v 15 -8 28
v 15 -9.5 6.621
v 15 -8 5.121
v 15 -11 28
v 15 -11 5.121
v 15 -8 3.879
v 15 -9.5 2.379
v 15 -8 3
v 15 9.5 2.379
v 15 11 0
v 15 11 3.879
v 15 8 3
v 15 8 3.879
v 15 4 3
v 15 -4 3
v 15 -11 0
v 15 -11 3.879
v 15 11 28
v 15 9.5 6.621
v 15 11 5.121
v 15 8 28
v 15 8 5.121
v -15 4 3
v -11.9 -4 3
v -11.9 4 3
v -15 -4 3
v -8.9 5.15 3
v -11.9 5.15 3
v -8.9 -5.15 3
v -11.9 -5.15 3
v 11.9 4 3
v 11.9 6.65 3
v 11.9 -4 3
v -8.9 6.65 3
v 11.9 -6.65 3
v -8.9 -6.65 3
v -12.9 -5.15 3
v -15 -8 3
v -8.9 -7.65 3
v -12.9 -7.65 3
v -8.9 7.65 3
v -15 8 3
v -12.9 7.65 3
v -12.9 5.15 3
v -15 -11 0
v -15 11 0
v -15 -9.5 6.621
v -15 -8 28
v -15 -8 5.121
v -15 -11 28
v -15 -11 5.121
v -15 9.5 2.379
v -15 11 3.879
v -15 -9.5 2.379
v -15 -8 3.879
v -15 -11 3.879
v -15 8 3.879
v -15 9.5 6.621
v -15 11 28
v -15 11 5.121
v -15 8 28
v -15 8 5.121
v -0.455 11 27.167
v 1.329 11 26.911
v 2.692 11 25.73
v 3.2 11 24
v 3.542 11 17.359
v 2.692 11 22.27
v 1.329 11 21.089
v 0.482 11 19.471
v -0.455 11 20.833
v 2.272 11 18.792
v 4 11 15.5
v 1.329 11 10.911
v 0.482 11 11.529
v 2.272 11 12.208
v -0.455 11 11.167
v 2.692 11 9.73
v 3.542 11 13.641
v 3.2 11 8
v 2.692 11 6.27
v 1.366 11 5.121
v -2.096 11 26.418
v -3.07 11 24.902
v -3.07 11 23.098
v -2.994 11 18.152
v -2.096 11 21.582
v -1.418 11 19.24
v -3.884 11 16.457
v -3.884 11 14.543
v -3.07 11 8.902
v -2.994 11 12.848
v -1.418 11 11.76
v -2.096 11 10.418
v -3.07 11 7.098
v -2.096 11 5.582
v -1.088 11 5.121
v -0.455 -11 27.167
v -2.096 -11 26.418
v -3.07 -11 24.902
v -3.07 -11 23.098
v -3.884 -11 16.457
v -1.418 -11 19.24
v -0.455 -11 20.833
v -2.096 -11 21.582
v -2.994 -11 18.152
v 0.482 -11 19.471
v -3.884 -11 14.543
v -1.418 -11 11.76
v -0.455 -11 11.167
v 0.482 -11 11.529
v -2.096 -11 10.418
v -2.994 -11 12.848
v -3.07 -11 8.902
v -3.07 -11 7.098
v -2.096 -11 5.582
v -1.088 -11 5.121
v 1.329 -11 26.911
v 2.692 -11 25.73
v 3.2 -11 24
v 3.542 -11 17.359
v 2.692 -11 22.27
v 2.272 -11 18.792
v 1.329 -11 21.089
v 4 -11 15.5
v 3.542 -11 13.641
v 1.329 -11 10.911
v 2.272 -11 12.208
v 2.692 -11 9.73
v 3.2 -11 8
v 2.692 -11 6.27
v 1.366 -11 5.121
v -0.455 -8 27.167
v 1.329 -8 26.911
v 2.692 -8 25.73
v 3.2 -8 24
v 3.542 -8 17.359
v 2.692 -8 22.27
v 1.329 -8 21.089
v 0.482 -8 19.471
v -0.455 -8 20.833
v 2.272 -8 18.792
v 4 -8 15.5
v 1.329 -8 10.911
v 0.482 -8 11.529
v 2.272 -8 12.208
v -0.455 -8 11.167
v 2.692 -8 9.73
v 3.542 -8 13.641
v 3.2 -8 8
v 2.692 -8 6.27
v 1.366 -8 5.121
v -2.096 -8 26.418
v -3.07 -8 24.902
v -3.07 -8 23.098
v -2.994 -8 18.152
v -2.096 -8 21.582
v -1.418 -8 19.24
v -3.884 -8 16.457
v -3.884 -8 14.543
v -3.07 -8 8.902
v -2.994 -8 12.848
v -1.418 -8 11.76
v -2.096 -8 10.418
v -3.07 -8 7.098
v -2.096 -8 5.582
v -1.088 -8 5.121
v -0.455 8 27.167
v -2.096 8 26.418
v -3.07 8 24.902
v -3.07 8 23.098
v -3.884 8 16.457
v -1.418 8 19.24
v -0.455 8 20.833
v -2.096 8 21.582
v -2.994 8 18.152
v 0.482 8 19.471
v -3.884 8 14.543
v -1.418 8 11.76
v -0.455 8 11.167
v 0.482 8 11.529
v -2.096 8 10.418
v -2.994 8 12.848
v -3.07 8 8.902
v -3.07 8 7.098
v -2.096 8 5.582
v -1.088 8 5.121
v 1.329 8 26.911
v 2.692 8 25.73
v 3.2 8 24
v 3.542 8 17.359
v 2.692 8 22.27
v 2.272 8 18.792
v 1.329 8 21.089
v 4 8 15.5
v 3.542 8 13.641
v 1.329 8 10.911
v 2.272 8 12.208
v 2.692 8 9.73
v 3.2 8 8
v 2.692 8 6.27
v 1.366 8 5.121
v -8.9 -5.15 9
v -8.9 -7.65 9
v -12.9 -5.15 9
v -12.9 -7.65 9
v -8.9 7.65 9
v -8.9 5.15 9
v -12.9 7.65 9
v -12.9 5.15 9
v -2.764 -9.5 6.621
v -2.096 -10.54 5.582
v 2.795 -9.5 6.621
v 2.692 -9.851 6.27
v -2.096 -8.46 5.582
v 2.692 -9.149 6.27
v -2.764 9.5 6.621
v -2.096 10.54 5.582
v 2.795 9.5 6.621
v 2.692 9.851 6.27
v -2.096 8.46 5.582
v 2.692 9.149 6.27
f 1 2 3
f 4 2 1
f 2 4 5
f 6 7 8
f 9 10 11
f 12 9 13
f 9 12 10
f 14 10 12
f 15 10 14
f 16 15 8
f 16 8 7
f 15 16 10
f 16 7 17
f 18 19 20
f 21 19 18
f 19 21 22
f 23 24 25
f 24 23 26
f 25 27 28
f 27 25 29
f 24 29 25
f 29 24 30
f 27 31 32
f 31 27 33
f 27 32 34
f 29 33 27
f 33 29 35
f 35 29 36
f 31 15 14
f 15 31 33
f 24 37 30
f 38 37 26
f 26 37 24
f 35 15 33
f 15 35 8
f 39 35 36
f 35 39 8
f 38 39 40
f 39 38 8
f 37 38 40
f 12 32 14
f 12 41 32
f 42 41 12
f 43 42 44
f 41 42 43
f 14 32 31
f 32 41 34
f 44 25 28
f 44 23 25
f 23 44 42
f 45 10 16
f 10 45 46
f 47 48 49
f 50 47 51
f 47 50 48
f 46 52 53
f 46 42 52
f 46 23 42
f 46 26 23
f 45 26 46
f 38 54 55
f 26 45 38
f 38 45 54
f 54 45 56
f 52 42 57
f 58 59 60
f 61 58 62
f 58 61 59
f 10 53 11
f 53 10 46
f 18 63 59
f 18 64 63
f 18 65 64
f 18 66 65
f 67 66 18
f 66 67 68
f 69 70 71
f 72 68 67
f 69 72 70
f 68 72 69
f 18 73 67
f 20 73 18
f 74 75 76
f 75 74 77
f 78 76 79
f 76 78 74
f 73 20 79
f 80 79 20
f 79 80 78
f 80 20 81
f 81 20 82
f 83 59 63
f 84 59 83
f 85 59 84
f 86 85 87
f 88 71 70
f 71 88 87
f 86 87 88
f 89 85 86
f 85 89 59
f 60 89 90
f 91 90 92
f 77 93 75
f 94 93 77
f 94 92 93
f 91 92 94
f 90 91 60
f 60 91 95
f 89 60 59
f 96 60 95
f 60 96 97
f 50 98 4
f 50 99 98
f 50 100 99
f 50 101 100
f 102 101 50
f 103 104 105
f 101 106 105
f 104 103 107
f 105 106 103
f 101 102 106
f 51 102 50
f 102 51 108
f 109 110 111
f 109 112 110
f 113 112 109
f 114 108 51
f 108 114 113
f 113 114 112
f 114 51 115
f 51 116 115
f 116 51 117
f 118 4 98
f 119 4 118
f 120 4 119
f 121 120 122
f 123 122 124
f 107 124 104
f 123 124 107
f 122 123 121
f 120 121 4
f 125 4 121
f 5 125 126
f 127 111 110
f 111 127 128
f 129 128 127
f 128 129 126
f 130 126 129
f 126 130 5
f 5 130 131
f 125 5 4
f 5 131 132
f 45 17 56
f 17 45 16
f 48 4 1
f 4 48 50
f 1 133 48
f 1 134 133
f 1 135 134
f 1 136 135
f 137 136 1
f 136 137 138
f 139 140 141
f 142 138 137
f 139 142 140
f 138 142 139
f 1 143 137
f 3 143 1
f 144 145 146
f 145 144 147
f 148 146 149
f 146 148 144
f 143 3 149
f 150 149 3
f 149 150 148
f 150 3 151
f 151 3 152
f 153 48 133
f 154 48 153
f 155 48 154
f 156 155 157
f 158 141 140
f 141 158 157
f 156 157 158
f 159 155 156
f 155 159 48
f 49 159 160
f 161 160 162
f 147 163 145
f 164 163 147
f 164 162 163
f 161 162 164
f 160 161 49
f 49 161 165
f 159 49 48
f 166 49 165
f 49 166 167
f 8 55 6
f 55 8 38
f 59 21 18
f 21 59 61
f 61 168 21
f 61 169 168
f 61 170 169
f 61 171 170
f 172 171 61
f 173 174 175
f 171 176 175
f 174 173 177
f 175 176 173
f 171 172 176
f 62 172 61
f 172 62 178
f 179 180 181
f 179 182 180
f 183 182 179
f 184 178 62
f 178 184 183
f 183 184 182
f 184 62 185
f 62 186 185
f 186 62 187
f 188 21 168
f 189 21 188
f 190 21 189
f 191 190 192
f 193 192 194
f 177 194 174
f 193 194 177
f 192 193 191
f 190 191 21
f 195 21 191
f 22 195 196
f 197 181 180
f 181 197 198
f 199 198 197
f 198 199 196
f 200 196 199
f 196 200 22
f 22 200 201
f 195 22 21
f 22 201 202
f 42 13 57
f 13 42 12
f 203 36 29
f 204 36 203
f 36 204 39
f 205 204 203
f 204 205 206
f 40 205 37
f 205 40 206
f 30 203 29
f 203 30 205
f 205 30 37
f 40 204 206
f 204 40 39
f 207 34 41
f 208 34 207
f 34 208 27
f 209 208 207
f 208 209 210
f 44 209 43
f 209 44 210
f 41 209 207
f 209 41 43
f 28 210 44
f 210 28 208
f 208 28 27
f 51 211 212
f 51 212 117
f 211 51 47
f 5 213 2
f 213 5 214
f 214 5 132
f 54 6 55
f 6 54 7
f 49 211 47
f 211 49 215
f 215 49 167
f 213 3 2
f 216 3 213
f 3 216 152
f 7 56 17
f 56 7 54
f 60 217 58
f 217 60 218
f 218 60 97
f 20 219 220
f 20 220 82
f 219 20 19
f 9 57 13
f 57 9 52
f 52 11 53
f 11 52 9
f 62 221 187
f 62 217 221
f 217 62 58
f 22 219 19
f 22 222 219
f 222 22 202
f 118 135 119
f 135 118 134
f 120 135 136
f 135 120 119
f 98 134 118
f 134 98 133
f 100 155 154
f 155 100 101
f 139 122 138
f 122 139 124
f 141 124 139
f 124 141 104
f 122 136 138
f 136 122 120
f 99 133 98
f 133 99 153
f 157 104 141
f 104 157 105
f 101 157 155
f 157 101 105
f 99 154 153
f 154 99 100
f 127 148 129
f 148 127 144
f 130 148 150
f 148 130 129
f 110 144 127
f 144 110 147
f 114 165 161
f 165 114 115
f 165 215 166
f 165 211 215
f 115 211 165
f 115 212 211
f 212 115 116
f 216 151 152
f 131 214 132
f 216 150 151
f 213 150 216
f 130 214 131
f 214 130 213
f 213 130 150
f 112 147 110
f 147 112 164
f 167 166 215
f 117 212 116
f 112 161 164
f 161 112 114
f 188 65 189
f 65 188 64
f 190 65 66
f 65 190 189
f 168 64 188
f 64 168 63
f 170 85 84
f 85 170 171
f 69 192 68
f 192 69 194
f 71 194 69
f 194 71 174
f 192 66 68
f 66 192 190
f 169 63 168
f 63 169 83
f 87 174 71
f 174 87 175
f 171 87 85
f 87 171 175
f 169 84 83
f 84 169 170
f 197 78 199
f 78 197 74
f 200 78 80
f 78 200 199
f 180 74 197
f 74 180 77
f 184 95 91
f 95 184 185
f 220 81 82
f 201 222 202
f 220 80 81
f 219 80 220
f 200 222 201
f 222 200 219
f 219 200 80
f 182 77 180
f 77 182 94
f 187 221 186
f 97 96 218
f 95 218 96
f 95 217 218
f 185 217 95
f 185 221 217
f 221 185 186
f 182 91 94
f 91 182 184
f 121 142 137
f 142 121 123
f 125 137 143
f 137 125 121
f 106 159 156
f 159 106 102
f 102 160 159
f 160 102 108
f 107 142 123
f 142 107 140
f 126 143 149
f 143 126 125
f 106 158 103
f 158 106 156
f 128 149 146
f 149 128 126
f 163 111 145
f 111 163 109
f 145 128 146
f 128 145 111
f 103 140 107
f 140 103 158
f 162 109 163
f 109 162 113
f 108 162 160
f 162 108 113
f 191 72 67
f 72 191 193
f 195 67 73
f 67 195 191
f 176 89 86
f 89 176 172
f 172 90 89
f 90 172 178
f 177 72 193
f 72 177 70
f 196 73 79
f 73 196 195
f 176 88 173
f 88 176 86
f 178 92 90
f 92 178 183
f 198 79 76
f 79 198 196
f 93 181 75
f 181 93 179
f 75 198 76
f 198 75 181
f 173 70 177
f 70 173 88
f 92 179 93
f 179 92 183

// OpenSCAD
// Parameters
servo_L = 23.0; //[11.5:46.0:0.1]
servo_W = 12.5; //[6.25:25.0:0.1]
servo_H = 23.0; //[11.5:46.0:0.1]
clearance = 0.4; //[0.2:1.2:0.05]
wall_t = 3.0; //[1.5:6.0:0.1]
base_t = 3.0; //[1.5:6.0:0.1]
bracket_L = 30.0; //[15.0:60.0:0.1]
bracket_W = 22.0; //[11.0:44.0:0.1]
bracket_H = 28.0; //[14.0:56.0:0.1]
horn_slot_L = 18.0; //[9.0:36.0:0.1]
horn_slot_W = 6.0; //[3.0:12.0:0.1]
horn_slot_offset_Z = 18.0; //[9.0:36.0:0.1]
mount_hole_d = 3.2; //[2.0:6.4:0.05]
mount_hole_spacing_Z = 16.0; //[8.0:32.0:0.1]
mount_hole_edge_margin = 4.0; //[2.0:8.0:0.1]
overlap = 1.0; //[0.5:2.0:0.1]
countersink_d = 6.4; //[4.0:12.0:0.1]
countersink_depth = 2.0; //[1.0:4.0:0.1]
cable_notch_W = 8.0; //[4.0:16.0:0.1]
cable_notch_H = 6.0; //[3.0:12.0:0.1]
tab_L = 4.0; //[2.0:8.0:0.1]
tab_W = 2.5; //[1.0:5.0:0.1]
tab_H = 6.0; //[3.0:12.0:0.1]
lighten_hole_d = 8.0; //[4.0:16.0:0.1]

// Base shapes
module base_plate() {
  translate([0, 0, base_t/2])
    cube([bracket_L, bracket_W, base_t], center=true);
}

module side_wall_left() {
  translate([0, -bracket_W/2 + wall_t/2, bracket_H/2])
    cube([bracket_L, wall_t, bracket_H], center=true);
}

module side_wall_right() {
  translate([0, bracket_W/2 - wall_t/2, bracket_H/2])
    cube([bracket_L, wall_t, bracket_H], center=true);
}

module servo_body_cavity() {
  translate([0, 0, base_t + (servo_H + 2*clearance)/2])
    cube([servo_L + 2*clearance, servo_W + 2*clearance, servo_H + 2*clearance], center=true);
}

module horn_slot_opening() {
  translate([bracket_L/2 - horn_slot_L/2 + overlap, 0, horn_slot_offset_Z])
    cube([horn_slot_L, horn_slot_W, bracket_H], center=true);
}

module mount_hole_cyl() {
  rotate([90, 0, 0])
    cylinder(r=mount_hole_d/2, h=wall_t + 2*overlap, center=true);
}

module countersink_cyl() {
  rotate([90, 0, 0])
    cylinder(r=countersink_d/2, h=countersink_depth + overlap, center=true);
}

module lighten_cyl() {
  rotate([90, 0, 0])
    cylinder(r=lighten_hole_d/2, h=wall_t + 2*overlap, center=true);
}

module cable_exit_notch() {
  translate([0, 0, base_t + cable_notch_H/2])
    cube([bracket_L, cable_notch_W, cable_notch_H], center=true);
}

module anti_rotation_tab_left() {
  translate([-(servo_L + 2*clearance)/2 + tab_L/2 - overlap, -(servo_W + 2*clearance)/2 + tab_W/2 - overlap, base_t + tab_H/2])
    cube([tab_L, tab_W, tab_H], center=true);
}

module anti_rotation_tab_right() {
  translate([-(servo_L + 2*clearance)/2 + tab_L/2 - overlap, (servo_W + 2*clearance)/2 - tab_W/2 + overlap, base_t + tab_H/2])
    cube([tab_L, tab_W, tab_H], center=true);
}

module chamfer_wedge_left() {
  translate([0, -bracket_W/2 + wall_t/2, base_t + wall_t/2])
    rotate([45, 0, 0])
    cube([bracket_L, wall_t, wall_t], center=true);
}

module chamfer_wedge_right() {
  translate([0, bracket_W/2 - wall_t/2, base_t + wall_t/2])
    rotate([-45, 0, 0])
    cube([bracket_L, wall_t, wall_t], center=true);
}

// Operations
module servo_cradle_u_frame() {
  union() {
    base_plate();
    side_wall_left();
    side_wall_right();
    anti_rotation_tab_left();
    anti_rotation_tab_right();
  }
}

module side_mounting_holes_left() {
  union() {
    translate([0, -bracket_W/2 + wall_t/2, bracket_H - mount_hole_edge_margin]) mount_hole_cyl();
    translate([0, -bracket_W/2 + wall_t/2, bracket_H - mount_hole_edge_margin - mount_hole_spacing_Z]) mount_hole_cyl();
  }
}

module side_mounting_holes_right() {
  union() {
    translate([0, bracket_W/2 - wall_t/2, bracket_H - mount_hole_edge_margin]) mount_hole_cyl();
    translate([0, bracket_W/2 - wall_t/2, bracket_H - mount_hole_edge_margin - mount_hole_spacing_Z]) mount_hole_cyl();
  }
}

module countersinks_counterbores() {
  union() {
    translate([0, -bracket_W/2 + wall_t/2, bracket_H - mount_hole_edge_margin]) countersink_cyl();
    translate([0, -bracket_W/2 + wall_t/2, bracket_H - mount_hole_edge_margin - mount_hole_spacing_Z]) countersink_cyl();
    translate([0, bracket_W/2 - wall_t/2, bracket_H - mount_hole_edge_margin]) countersink_cyl();
    translate([0, bracket_W/2 - wall_t/2, bracket_H - mount_hole_edge_margin - mount_hole_spacing_Z]) countersink_cyl();
  }
}

module lightening_cutouts() {
  union() {
    translate([0, -bracket_W/2 + wall_t/2, base_t + (bracket_H - base_t)/2]) lighten_cyl();
    translate([0, bracket_W/2 - wall_t/2, base_t + (bracket_H - base_t)/2]) lighten_cyl();
  }
}

module fillets_chamfers() {
  union() {
    chamfer_wedge_left();
    chamfer_wedge_right();
  }
}

module bracket_with_chamfers_removed() {
  difference() {
    servo_cradle_u_frame();
    fillets_chamfers();
  }
}

module bracket_main_openings() {
  difference() {
    bracket_with_chamfers_removed();
    servo_body_cavity();
    horn_slot_opening();
    cable_exit_notch();
    side_mounting_holes_left();
    side_mounting_holes_right();
    countersinks_counterbores();
    lightening_cutouts();
  }
}

module complete_model() {
  union() {
    bracket_main_openings();
    anti_rotation_tab_left();
    anti_rotation_tab_right();
  }
}

// Final output
complete_model();
